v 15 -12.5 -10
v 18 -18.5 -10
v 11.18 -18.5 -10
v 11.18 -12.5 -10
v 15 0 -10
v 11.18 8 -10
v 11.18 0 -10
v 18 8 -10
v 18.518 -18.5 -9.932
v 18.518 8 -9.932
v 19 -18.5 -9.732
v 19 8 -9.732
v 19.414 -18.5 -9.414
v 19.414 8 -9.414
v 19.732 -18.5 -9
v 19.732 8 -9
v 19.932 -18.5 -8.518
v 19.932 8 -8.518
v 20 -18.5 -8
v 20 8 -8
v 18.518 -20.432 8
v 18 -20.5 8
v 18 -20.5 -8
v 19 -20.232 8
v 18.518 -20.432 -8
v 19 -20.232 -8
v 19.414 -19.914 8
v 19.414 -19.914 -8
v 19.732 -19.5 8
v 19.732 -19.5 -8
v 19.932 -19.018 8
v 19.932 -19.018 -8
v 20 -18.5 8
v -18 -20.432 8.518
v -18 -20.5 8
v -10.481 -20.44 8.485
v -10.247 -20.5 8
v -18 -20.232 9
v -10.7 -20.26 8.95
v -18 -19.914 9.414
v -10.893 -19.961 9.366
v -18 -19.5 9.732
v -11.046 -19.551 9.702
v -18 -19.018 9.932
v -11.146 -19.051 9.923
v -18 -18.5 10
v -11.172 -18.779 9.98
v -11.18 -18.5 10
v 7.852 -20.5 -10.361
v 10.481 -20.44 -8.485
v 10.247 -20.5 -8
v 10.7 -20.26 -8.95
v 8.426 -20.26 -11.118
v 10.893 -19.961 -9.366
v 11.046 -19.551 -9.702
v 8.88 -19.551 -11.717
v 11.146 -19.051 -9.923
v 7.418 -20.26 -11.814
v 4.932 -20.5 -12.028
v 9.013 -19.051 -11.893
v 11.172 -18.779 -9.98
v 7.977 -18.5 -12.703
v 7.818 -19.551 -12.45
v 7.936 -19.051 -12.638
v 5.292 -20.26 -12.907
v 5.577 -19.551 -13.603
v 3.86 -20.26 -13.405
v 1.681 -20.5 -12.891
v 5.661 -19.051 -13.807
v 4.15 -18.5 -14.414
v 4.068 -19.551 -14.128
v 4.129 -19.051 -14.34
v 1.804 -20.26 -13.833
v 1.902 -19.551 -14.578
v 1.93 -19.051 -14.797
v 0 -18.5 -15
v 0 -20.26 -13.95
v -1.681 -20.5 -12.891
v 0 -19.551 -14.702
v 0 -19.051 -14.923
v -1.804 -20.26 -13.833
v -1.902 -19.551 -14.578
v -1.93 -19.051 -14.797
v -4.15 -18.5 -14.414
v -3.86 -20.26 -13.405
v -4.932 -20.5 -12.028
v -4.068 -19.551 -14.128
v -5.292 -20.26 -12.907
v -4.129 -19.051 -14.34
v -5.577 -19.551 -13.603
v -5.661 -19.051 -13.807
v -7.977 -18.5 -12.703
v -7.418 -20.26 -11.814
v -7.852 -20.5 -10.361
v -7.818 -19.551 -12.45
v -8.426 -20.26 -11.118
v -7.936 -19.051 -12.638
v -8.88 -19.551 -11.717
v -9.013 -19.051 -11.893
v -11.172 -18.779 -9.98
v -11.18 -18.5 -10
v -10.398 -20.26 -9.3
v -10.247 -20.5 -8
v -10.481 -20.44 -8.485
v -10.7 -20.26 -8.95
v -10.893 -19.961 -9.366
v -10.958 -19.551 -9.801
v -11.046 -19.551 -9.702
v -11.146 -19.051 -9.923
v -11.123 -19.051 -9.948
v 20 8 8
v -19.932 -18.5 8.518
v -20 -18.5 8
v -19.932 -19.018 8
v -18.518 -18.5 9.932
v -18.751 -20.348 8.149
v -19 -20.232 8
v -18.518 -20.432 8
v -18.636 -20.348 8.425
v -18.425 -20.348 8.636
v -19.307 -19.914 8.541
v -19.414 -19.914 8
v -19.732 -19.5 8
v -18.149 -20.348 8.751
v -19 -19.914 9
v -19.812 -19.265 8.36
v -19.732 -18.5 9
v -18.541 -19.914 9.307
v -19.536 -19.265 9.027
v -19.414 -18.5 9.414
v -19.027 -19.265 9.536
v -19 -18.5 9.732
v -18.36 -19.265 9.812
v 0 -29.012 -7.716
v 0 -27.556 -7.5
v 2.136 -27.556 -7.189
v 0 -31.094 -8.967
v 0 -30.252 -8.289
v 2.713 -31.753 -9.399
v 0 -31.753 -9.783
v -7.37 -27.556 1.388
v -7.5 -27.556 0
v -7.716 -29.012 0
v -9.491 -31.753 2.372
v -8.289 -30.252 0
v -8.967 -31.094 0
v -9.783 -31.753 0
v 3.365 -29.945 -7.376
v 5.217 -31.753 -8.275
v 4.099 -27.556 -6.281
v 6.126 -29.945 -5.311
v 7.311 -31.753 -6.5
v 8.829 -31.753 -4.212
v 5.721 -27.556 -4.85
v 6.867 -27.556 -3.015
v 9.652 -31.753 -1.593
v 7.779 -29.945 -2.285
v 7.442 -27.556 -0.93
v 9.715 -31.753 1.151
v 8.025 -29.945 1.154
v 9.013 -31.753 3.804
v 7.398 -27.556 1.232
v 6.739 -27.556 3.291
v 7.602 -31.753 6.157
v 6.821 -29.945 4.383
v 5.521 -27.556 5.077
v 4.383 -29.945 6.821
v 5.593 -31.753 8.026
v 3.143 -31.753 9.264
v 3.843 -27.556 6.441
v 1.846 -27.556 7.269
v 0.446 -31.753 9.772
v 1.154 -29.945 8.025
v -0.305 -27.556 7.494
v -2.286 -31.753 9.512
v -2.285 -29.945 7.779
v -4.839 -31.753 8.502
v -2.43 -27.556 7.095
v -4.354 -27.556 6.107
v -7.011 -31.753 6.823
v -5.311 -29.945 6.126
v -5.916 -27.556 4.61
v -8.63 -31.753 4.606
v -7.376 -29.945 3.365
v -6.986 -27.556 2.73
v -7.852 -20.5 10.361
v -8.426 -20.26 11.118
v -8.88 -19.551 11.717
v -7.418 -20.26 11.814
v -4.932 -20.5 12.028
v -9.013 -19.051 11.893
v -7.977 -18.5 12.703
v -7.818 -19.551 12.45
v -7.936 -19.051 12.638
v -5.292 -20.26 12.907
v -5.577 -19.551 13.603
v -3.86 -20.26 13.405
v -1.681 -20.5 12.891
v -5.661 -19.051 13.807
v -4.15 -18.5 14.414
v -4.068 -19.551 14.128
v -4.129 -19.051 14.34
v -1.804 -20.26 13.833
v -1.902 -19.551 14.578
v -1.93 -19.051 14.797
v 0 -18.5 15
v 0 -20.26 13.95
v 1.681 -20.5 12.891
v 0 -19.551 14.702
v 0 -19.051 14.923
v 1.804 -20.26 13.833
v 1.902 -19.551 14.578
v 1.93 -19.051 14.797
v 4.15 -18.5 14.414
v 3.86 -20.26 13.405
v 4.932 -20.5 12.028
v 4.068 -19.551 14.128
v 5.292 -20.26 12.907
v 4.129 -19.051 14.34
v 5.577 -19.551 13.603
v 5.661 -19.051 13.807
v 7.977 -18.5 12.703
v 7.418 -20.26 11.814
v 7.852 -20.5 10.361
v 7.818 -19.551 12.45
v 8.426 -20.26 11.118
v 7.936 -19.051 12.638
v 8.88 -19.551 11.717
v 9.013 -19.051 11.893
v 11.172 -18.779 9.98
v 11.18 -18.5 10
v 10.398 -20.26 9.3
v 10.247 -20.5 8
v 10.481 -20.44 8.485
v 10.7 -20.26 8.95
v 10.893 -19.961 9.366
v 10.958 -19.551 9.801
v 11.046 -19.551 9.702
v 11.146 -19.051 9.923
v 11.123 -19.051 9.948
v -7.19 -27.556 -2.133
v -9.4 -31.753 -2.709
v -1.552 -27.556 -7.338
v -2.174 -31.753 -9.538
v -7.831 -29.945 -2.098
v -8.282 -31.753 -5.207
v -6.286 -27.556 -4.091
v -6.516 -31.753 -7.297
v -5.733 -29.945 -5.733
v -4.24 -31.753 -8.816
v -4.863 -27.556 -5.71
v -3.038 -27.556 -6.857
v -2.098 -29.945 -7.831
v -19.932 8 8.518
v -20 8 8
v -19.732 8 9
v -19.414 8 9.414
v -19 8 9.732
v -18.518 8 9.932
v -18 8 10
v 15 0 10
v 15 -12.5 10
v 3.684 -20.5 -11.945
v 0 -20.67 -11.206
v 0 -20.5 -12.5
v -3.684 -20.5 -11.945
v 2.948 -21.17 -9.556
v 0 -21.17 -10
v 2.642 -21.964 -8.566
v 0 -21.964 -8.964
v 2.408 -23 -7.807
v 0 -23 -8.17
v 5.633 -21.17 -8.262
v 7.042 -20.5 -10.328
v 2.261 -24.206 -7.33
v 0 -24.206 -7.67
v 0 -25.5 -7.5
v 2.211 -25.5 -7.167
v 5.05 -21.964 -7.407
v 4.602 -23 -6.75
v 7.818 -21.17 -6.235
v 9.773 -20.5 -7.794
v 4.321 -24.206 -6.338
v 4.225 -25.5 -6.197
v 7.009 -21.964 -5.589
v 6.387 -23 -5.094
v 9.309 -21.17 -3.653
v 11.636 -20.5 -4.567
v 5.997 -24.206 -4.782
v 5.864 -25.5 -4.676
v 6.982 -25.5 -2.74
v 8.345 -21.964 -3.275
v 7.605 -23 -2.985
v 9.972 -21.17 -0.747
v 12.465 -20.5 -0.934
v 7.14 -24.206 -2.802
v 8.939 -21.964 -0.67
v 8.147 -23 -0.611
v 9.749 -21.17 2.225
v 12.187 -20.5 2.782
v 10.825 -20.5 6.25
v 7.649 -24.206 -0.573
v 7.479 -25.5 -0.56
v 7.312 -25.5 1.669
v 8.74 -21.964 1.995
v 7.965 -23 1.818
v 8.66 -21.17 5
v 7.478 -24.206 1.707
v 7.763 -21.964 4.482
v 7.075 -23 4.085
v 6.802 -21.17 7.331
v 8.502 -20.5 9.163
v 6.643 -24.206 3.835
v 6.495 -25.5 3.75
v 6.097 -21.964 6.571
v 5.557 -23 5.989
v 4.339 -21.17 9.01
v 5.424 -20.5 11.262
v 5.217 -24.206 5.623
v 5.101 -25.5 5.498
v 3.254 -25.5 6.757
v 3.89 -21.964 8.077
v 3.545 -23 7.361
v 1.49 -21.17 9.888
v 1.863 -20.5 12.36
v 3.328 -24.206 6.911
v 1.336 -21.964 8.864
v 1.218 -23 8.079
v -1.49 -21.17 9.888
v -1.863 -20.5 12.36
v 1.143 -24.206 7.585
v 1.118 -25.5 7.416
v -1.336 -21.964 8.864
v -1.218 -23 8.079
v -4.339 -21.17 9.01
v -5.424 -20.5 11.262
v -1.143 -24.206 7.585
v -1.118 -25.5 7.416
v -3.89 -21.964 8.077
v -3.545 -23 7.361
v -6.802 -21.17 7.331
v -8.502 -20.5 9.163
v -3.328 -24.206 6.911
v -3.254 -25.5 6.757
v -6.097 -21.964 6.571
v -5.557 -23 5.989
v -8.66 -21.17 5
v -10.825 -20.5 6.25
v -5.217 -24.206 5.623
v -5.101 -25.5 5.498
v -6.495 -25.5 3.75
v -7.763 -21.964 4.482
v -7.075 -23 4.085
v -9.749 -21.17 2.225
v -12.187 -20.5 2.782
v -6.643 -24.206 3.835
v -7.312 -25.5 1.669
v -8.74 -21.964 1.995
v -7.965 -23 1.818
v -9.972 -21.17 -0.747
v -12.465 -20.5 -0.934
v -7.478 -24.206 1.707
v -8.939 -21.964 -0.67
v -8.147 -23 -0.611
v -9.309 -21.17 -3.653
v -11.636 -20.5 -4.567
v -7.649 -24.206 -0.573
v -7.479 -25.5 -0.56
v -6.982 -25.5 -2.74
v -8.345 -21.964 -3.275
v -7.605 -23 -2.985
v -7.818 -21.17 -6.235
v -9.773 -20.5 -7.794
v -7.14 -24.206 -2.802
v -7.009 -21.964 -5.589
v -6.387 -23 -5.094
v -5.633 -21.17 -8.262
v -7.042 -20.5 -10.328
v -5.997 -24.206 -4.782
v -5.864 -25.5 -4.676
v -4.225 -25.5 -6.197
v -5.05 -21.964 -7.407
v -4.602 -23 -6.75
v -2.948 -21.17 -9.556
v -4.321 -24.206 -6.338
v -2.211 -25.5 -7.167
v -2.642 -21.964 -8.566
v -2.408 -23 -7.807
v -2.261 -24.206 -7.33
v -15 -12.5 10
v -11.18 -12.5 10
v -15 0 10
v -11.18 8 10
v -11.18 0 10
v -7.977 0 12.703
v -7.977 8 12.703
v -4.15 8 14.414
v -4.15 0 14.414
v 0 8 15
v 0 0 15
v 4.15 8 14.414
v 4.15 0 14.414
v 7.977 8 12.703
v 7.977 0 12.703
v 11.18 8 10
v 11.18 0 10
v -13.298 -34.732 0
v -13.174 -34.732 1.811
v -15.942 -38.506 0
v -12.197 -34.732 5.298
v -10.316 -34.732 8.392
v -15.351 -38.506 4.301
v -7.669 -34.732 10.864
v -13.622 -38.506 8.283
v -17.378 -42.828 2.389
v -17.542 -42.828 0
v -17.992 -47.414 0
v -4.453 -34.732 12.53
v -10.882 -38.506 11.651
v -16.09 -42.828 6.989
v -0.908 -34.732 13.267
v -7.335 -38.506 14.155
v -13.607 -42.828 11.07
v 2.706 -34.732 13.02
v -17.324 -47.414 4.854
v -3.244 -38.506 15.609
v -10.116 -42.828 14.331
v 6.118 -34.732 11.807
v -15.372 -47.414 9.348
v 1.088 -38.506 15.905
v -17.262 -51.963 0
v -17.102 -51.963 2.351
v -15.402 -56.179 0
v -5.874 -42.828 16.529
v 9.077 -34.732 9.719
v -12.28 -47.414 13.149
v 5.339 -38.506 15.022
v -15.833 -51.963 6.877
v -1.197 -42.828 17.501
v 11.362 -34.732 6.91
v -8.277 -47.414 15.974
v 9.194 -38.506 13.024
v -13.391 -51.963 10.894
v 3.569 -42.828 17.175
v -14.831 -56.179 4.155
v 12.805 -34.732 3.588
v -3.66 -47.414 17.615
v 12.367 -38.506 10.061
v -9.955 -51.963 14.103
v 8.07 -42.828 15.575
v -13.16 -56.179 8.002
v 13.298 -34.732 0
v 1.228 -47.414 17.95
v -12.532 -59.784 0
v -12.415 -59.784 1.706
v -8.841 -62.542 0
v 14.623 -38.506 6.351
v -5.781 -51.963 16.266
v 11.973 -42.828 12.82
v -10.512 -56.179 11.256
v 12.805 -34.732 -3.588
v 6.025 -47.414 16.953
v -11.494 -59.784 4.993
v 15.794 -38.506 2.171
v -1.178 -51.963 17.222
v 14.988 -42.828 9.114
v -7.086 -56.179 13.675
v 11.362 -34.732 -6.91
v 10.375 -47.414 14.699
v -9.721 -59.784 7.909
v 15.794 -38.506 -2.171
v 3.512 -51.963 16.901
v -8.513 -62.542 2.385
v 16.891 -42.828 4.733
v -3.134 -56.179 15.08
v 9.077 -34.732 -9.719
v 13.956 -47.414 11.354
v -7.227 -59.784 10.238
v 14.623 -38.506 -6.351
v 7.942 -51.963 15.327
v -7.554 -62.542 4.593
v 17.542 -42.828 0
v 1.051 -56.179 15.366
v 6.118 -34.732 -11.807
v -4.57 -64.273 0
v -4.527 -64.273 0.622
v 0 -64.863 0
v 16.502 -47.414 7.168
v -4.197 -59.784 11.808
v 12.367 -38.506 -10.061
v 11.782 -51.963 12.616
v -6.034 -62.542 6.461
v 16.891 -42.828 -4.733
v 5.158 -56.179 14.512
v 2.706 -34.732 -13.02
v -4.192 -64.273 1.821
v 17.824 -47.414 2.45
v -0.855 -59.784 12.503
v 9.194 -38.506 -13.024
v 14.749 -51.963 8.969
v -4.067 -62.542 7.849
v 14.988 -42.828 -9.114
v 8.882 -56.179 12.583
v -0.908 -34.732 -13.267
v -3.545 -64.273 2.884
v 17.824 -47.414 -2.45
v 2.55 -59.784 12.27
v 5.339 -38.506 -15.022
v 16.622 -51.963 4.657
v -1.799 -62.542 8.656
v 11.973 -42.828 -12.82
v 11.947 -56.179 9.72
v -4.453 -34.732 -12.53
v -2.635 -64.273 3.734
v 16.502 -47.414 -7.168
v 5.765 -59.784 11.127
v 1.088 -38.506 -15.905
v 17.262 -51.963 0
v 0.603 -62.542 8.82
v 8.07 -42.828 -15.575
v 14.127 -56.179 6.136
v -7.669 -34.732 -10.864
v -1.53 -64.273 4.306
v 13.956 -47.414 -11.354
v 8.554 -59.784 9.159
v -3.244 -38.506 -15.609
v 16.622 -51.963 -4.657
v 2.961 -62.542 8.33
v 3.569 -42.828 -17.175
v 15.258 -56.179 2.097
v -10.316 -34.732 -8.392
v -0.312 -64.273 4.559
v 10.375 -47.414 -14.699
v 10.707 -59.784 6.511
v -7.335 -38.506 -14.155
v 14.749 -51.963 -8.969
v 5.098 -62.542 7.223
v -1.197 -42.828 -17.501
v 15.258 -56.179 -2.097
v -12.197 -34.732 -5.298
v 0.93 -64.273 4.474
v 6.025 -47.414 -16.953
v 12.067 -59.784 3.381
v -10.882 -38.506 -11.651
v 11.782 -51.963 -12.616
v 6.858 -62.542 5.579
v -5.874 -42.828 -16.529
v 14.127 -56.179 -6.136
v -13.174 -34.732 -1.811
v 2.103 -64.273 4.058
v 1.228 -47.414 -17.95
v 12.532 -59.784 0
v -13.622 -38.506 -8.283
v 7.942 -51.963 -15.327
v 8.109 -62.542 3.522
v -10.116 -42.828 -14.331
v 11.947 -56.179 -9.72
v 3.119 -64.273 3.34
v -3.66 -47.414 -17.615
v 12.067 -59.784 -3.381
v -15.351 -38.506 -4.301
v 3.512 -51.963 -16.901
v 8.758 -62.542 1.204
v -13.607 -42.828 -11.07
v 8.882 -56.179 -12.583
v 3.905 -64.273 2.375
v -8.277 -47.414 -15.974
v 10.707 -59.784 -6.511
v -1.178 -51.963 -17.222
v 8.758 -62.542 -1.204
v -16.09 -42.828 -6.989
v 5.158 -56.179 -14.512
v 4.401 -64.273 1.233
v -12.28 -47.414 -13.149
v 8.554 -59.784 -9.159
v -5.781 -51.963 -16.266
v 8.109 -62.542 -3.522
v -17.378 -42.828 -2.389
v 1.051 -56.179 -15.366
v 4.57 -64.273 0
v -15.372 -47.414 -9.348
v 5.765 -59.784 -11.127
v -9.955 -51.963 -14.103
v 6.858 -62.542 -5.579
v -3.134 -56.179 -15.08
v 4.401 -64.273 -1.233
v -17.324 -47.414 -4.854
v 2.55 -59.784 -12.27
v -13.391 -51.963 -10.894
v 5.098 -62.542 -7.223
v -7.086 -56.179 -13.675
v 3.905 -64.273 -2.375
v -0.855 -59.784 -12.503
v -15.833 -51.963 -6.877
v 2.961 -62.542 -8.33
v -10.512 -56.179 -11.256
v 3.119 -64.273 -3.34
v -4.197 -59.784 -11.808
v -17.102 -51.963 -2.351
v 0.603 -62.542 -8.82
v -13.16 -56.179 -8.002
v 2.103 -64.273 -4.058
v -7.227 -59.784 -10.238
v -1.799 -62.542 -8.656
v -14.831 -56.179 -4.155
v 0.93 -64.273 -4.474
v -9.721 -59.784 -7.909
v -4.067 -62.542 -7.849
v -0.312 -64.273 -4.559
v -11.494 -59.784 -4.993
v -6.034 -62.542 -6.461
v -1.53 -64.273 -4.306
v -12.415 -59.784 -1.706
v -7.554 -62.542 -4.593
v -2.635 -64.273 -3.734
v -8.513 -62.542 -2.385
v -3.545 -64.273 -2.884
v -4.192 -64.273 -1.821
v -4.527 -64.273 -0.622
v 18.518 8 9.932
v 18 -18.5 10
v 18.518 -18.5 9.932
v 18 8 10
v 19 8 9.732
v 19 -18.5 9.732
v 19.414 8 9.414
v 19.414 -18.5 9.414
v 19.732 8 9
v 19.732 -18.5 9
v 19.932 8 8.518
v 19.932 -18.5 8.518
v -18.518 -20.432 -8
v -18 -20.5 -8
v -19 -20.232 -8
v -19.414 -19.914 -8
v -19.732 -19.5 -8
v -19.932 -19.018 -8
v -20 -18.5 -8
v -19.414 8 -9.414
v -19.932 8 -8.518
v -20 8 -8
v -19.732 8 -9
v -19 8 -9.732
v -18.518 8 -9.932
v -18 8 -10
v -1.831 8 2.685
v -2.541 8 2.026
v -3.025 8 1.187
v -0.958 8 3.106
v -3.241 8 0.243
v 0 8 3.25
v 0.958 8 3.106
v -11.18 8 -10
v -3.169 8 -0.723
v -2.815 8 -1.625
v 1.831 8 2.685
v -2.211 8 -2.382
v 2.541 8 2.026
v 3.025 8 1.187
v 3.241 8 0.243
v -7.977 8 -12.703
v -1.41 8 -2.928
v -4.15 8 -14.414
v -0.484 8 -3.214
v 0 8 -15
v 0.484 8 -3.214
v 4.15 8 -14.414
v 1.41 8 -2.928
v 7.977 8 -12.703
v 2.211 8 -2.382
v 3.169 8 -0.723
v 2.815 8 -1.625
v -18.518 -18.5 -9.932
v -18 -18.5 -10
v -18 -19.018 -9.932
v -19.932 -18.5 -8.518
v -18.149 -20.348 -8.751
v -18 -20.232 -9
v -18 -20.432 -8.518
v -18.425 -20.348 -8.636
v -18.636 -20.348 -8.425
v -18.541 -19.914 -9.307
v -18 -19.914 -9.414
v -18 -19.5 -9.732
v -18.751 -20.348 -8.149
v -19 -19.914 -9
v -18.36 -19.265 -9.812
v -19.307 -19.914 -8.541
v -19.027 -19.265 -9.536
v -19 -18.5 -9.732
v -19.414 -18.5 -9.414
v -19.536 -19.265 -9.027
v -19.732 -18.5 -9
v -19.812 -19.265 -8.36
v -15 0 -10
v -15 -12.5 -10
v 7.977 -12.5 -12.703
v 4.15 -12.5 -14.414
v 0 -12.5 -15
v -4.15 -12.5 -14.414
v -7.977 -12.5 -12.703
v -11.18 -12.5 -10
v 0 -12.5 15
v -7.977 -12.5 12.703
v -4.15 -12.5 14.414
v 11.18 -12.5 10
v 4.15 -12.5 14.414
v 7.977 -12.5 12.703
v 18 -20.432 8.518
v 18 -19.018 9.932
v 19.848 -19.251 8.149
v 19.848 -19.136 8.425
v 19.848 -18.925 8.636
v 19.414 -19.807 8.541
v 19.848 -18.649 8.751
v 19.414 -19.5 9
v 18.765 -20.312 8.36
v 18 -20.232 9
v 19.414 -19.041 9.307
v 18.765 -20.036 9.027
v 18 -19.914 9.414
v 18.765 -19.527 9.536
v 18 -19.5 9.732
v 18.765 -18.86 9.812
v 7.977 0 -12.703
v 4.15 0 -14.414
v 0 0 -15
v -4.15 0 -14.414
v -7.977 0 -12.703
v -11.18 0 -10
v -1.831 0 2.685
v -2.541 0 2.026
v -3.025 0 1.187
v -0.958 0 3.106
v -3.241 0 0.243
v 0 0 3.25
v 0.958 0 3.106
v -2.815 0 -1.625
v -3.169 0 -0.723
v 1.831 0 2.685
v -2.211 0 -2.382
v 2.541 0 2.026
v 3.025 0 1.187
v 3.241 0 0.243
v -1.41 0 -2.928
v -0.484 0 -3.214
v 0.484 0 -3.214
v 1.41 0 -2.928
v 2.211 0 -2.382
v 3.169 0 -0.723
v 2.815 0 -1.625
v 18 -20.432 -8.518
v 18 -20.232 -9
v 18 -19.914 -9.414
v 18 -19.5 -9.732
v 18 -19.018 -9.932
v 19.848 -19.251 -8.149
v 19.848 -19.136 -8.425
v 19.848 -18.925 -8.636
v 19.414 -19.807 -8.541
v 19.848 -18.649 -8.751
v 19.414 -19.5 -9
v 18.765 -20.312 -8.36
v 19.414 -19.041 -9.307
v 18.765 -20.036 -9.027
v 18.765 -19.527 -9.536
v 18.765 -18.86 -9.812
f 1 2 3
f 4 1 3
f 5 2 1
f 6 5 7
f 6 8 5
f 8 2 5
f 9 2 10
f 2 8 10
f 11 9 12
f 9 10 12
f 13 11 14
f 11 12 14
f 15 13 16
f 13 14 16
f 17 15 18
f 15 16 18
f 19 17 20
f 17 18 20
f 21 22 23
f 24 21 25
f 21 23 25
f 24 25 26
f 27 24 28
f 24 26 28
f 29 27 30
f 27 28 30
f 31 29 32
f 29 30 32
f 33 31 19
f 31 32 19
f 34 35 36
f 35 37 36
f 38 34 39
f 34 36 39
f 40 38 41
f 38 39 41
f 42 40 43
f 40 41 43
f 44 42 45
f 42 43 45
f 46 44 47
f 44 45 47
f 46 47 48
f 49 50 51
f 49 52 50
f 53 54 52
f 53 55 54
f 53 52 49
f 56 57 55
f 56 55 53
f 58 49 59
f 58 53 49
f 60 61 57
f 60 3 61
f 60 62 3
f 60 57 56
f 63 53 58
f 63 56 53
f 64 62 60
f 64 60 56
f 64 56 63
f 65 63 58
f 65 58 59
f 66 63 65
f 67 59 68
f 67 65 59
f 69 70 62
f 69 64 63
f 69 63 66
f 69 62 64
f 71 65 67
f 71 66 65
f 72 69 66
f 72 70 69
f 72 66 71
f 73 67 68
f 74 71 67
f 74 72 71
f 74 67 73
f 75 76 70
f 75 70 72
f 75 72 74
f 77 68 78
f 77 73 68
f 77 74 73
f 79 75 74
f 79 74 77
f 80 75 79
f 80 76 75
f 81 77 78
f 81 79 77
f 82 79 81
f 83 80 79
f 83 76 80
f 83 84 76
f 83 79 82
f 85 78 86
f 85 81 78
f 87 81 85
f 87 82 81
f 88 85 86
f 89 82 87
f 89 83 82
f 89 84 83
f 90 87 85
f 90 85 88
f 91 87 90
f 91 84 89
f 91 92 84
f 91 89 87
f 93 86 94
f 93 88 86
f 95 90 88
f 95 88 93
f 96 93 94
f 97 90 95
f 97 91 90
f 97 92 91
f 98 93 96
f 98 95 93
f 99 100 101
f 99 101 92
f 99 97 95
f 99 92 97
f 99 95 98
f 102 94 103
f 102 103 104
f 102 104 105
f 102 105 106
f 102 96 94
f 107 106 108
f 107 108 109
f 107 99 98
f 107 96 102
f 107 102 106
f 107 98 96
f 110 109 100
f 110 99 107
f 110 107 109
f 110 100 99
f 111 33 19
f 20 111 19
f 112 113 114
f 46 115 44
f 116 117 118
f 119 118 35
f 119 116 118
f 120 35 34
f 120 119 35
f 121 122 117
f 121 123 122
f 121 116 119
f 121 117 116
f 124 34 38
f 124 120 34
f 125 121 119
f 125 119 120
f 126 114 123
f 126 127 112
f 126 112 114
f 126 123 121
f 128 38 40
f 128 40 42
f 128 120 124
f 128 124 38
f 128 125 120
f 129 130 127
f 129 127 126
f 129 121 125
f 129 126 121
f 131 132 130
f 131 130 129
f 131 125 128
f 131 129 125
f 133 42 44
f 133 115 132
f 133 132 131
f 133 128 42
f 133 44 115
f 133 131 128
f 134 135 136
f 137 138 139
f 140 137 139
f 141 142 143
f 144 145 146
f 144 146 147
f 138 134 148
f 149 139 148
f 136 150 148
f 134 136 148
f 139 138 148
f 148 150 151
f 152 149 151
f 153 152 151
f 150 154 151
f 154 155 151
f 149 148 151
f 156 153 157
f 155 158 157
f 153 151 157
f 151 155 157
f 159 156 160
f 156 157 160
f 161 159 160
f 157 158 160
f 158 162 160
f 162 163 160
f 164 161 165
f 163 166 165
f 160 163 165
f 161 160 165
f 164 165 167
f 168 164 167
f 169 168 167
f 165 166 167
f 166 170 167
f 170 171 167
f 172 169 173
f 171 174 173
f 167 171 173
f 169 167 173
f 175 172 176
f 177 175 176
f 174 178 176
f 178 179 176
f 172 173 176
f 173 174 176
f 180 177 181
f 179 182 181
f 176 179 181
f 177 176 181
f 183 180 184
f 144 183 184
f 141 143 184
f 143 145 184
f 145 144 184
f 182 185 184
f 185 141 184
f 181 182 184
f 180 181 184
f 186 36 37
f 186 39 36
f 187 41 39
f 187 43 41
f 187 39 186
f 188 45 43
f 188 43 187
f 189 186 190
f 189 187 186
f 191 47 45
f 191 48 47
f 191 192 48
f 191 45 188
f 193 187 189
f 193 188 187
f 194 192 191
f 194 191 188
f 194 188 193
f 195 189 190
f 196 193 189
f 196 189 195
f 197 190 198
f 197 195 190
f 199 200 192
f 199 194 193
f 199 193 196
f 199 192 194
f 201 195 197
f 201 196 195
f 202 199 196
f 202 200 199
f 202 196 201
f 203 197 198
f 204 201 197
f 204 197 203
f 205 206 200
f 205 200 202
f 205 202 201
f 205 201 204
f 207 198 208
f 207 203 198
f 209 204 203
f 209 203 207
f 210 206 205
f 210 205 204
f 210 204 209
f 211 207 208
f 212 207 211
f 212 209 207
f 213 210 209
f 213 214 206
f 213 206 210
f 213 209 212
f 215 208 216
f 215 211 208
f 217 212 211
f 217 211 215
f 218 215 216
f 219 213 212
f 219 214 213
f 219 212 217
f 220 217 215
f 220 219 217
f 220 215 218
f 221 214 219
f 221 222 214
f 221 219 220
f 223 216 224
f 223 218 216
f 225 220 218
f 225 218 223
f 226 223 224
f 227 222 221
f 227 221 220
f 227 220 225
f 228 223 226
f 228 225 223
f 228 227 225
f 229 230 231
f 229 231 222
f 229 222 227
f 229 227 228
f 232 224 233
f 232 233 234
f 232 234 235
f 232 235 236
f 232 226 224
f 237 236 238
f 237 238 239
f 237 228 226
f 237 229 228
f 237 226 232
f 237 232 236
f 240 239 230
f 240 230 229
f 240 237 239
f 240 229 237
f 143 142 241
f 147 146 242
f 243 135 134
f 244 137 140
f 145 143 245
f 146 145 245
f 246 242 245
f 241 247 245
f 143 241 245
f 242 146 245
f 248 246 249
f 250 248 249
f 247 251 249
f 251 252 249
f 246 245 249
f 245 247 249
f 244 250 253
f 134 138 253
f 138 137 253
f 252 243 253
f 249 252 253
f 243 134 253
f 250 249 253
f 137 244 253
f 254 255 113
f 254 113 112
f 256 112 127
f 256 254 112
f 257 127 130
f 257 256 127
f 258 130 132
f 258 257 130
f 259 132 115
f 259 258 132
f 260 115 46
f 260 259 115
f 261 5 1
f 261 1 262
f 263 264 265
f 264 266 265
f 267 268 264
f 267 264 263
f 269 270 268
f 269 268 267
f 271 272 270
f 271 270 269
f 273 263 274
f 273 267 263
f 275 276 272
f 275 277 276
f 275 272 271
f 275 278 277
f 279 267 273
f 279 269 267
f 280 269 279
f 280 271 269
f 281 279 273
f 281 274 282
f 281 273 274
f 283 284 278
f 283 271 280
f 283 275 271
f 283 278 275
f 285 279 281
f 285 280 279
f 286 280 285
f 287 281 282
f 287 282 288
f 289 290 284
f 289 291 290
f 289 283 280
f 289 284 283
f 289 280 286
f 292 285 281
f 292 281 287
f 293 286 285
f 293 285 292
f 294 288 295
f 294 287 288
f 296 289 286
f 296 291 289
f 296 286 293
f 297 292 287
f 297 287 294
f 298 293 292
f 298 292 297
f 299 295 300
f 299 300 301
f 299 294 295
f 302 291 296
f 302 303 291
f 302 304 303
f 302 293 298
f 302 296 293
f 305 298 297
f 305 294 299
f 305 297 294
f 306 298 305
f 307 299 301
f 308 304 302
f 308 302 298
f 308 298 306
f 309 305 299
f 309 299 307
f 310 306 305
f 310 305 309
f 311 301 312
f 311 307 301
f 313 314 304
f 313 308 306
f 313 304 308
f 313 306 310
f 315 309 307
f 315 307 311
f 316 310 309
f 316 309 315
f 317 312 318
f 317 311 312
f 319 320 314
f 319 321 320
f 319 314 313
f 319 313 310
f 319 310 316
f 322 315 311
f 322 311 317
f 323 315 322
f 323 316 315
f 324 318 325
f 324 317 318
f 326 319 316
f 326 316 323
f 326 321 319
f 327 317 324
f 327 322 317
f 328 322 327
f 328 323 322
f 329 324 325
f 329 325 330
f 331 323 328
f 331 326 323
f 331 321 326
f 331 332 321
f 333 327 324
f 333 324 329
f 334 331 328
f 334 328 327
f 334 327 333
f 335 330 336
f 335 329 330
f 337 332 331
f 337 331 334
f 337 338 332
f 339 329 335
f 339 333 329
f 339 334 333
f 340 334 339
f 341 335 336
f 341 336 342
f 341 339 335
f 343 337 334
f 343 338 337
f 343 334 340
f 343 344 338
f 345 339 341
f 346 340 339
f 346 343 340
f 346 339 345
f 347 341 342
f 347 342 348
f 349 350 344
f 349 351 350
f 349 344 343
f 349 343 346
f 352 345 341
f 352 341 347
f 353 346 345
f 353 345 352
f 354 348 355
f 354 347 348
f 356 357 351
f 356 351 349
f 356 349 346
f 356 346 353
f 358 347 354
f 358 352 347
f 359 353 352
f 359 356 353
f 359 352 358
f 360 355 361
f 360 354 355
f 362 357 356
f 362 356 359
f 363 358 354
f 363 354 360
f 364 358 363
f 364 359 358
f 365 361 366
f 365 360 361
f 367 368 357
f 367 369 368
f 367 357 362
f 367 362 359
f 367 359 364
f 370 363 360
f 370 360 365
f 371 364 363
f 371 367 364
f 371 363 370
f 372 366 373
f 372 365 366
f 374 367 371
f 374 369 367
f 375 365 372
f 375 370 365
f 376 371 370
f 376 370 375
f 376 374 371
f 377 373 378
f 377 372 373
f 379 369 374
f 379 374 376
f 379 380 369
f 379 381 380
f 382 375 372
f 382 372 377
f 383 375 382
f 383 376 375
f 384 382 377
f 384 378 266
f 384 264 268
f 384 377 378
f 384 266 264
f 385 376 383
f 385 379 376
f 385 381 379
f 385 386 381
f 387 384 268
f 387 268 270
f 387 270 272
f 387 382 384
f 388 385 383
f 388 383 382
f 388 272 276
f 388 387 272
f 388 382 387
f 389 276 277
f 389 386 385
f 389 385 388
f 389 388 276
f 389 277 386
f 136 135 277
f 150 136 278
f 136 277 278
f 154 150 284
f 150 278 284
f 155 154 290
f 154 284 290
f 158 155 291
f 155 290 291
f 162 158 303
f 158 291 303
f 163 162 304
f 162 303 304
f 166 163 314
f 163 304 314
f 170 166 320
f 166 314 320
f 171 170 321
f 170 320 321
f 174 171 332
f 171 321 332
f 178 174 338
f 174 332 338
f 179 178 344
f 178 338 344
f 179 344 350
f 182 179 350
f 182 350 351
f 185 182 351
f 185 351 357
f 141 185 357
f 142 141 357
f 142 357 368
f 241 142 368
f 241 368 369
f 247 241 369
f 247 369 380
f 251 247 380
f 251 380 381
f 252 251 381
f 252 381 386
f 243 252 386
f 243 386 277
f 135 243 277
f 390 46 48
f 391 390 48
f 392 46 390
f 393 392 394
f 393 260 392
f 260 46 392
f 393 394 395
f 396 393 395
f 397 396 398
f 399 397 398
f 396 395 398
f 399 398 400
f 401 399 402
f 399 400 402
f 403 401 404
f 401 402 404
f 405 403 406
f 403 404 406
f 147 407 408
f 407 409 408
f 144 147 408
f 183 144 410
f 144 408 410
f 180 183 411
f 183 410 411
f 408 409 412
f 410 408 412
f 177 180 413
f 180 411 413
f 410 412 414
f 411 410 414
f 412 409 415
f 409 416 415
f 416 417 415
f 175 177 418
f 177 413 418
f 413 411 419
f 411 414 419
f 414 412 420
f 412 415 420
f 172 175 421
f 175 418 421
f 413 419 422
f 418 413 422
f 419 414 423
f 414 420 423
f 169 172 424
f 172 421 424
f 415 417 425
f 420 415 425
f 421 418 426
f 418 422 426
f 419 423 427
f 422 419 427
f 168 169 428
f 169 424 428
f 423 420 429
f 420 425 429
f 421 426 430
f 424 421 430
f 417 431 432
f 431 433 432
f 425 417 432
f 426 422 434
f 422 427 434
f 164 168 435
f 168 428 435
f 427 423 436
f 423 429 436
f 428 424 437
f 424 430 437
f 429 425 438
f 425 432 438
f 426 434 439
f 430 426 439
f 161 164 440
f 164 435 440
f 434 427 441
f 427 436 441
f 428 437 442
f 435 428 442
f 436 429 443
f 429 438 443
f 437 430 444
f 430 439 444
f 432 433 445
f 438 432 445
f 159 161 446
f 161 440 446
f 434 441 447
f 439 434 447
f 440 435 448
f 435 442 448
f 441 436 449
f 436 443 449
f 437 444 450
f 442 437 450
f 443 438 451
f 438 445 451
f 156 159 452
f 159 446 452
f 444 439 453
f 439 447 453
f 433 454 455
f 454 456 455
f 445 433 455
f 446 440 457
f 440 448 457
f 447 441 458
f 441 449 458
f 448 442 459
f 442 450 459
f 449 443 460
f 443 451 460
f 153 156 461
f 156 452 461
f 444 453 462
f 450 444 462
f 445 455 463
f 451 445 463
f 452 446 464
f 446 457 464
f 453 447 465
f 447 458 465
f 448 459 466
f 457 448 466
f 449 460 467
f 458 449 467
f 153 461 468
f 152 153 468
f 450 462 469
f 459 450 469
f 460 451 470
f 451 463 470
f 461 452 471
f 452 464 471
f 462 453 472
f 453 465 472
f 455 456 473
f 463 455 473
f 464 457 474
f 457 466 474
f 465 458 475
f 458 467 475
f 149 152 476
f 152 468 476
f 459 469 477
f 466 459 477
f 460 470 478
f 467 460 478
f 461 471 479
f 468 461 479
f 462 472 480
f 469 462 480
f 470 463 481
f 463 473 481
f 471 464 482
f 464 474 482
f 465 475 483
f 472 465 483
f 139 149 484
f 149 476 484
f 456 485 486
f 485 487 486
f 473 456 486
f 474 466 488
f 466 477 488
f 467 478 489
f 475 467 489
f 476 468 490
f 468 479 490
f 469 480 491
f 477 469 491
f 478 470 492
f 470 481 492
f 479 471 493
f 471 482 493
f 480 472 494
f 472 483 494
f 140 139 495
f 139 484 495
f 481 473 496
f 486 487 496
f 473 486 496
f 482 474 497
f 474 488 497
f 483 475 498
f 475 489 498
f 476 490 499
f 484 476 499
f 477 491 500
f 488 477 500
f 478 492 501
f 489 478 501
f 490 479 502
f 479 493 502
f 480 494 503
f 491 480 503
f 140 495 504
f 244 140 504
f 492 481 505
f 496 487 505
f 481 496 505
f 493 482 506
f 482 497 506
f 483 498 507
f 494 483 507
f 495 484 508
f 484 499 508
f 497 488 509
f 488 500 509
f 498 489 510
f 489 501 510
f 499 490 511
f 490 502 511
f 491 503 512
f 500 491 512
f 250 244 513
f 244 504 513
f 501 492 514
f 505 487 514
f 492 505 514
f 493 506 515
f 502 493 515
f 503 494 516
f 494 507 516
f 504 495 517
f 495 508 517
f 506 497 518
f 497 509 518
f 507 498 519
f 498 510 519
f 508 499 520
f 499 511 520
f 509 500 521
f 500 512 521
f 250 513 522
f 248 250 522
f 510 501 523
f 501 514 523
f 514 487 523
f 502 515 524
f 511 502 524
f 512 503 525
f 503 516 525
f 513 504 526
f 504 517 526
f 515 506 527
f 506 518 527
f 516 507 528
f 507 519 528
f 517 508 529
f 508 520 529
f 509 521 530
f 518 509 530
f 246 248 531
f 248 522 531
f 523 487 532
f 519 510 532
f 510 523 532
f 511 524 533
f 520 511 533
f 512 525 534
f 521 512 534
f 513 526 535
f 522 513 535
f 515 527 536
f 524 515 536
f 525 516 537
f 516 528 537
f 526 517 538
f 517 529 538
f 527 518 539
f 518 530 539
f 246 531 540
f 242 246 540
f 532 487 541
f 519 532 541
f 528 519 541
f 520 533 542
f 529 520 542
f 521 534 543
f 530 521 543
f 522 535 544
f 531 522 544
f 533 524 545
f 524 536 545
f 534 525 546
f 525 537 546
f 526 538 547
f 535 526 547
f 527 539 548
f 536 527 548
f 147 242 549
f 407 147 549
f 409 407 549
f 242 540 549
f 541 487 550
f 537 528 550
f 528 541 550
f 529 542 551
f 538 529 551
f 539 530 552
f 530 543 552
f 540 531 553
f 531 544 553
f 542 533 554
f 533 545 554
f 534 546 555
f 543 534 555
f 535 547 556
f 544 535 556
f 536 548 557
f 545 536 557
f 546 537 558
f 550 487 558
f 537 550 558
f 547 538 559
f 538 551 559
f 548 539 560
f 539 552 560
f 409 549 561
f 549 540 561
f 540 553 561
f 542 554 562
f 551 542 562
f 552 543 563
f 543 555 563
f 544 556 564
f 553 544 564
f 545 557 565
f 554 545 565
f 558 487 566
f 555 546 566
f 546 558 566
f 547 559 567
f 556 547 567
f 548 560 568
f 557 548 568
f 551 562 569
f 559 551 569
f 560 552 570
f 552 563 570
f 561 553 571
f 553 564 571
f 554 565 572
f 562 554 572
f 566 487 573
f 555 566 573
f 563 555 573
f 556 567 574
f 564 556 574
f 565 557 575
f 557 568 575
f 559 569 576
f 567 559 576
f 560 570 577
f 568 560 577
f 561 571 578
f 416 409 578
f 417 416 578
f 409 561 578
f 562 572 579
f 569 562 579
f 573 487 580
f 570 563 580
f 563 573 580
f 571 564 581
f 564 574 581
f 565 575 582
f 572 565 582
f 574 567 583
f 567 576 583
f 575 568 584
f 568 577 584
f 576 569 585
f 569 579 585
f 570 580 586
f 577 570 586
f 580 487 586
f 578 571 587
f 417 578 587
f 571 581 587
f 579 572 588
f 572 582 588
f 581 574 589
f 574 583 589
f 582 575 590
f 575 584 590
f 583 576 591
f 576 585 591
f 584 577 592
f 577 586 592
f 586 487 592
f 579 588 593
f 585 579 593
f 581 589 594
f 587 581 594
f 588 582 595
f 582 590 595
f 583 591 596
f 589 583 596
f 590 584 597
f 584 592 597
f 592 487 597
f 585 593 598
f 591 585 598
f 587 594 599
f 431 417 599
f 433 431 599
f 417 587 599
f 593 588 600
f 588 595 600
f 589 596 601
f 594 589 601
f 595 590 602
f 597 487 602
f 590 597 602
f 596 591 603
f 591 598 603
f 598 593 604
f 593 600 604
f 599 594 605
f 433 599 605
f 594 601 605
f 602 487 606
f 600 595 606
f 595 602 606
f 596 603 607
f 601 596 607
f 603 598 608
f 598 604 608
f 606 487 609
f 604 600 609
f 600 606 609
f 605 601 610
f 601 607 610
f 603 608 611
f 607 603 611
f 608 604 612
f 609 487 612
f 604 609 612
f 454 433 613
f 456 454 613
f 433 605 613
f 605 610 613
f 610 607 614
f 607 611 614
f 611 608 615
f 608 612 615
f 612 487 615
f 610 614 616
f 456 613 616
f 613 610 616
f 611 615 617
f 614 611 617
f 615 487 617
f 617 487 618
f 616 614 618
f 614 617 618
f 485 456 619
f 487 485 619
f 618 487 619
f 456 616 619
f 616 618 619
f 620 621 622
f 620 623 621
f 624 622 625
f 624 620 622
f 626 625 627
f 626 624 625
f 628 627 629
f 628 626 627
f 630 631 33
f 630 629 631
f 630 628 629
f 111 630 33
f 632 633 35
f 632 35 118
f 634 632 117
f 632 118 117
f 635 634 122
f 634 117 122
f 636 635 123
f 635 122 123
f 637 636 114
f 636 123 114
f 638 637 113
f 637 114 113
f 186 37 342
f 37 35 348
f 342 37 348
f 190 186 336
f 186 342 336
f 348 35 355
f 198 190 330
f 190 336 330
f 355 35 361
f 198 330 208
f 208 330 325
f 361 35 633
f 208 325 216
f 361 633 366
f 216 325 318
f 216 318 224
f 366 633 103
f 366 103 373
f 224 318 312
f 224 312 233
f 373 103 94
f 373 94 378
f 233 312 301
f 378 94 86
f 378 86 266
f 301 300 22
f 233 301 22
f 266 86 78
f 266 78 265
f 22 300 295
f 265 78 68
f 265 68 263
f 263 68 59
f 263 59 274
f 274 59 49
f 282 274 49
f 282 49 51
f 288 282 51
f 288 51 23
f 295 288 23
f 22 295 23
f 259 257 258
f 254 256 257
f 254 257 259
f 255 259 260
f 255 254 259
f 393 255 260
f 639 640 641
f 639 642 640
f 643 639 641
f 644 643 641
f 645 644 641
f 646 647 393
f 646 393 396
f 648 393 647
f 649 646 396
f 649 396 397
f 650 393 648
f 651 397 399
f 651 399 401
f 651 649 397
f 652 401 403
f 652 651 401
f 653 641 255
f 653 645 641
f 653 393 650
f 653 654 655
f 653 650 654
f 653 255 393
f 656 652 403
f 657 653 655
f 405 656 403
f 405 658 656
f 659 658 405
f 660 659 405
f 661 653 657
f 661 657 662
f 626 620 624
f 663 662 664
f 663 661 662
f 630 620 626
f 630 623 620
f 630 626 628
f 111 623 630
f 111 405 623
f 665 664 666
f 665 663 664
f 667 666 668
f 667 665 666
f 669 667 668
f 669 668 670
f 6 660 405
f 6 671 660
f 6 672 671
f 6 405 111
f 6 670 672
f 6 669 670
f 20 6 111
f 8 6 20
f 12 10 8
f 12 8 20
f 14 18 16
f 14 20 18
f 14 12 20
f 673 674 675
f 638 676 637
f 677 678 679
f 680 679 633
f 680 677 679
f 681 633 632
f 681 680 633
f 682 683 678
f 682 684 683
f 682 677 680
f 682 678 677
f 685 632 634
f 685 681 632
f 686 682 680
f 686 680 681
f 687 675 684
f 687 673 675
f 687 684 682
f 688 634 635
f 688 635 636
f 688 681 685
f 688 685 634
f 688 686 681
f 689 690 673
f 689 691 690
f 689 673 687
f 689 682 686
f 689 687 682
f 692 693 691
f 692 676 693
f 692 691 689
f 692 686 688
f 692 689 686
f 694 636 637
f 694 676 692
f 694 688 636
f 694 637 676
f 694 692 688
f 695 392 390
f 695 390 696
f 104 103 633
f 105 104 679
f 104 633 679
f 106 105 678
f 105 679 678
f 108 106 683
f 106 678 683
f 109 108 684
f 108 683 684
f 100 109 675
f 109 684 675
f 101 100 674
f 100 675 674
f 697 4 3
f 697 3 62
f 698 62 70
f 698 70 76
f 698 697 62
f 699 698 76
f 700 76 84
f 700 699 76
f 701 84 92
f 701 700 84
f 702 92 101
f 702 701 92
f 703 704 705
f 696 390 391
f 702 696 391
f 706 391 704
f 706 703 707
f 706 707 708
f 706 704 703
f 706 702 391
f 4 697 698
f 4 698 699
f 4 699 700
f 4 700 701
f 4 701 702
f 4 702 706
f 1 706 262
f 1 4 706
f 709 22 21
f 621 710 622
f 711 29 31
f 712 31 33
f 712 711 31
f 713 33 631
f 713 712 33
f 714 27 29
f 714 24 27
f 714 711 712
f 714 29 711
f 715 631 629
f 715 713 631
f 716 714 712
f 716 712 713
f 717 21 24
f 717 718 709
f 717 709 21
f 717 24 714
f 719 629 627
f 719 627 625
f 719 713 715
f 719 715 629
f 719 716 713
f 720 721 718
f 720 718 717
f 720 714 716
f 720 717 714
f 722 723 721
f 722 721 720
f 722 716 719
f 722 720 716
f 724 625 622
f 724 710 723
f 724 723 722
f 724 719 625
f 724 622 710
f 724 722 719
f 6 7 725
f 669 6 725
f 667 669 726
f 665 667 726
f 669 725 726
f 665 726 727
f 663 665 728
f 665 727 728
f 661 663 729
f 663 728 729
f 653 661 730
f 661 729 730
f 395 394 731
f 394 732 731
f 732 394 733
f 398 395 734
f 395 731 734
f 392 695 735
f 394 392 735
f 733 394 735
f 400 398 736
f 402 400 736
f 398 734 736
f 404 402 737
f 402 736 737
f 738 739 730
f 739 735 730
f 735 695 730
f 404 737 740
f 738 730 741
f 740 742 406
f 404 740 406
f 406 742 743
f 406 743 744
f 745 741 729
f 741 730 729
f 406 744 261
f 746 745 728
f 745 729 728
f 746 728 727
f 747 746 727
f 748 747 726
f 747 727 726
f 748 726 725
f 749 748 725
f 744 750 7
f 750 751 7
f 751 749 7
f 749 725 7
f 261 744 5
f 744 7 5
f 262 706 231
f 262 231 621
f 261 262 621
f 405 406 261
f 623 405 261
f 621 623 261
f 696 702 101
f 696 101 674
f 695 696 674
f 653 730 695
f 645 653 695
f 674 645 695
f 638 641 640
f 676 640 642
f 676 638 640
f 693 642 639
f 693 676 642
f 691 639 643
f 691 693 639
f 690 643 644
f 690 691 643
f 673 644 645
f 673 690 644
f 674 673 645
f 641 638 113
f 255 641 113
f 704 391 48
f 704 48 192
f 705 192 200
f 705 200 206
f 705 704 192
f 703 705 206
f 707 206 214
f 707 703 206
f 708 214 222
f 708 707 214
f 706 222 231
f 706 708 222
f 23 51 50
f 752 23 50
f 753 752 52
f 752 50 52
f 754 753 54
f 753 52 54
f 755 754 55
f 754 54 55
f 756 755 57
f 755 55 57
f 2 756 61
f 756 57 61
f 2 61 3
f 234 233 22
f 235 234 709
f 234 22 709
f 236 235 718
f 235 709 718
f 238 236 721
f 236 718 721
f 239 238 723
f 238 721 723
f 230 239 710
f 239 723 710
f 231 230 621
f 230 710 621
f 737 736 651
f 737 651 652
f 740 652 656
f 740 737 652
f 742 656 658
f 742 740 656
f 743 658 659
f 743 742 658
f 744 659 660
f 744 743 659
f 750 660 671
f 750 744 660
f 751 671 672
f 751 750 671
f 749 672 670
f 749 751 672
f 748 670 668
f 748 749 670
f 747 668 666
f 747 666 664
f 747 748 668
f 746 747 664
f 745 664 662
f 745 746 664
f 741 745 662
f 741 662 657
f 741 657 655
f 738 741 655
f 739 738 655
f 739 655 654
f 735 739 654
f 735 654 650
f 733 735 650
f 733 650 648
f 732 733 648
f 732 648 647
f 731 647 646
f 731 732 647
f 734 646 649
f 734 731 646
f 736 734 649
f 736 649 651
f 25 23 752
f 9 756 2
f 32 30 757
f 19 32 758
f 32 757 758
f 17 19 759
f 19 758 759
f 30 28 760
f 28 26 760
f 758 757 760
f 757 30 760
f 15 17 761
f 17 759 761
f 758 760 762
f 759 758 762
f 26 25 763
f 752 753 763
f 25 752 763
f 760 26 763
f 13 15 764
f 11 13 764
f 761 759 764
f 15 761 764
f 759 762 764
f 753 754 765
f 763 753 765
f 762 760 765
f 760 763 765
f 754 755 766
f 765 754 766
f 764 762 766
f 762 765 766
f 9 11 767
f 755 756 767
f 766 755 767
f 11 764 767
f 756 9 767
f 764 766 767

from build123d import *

# Parameters (mm, degrees)
SKETCH1_R           = 3.25
BOSS_EXTRUDE1_DEPTH = 8
BOSS_EXTRUDE2_DEPTH = 12.5
BOSS_EXTRUDE3_START = -12.5
BOSS_EXTRUDE3_DEPTH = 8
SKETCH2_R           = 7.5
BOSS_EXTRUDE4_DEPTH = 10
FILLET2_R           = 2
FILLET3_R           = 5


with BuildPart() as part:
    # Sketch1 → Boss-Extrude1 (new body)
    with BuildSketch(Plane(origin=(0, 0, 0), x_dir=(1, 0, 0), z_dir=(0, 1, 0))):
        with BuildLine():
            Line((-20, 10), (-20, -10))
            Line((-20, -10), (-11.180339887, -10))
            ThreePointArc((-11.180339887, -10), (0, -15), (11.180339887, -10))
            Line((11.180339887, -10), (20, -10))
            Line((20, -10), (20, 10))
            Line((20, 10), (11.180339887, 10))
            ThreePointArc((11.180339887, 10), (0, 15), (-11.180339887, 10))
            Line((-11.180339887, 10), (-20, 10))
        make_face()
        with Locations(Location((0, 0, 0), (0, 0, 270))):
            Circle(SKETCH1_R, mode=Mode.SUBTRACT)
    extrude(amount=BOSS_EXTRUDE1_DEPTH)

    # Sketch1<3> → Boss-Extrude2 (add)
    with BuildSketch(Plane(origin=(0, 0, 0), x_dir=(1, 0, 0), z_dir=(0, 1, 0))):
        Polygon((-15, 10), (-20, 10), (-20, -10), (-15, -10), (-15, 0), align=None)
        Polygon((20, 10), (15, 10), (15, 0), (15, -10), (20, -10), align=None)
    extrude(amount=-BOSS_EXTRUDE2_DEPTH)

    # Sketch1<4> → Boss-Extrude3 (add)
    with BuildSketch(Plane(origin=(0, 0, 0), x_dir=(1, 0, 0), z_dir=(0, 1, 0)).offset(BOSS_EXTRUDE3_START)):
        with BuildLine():
            Line((-20, 10), (-20, -10))
            Line((-20, -10), (-11.180339887, -10))
            ThreePointArc((-11.180339887, -10), (0, -15), (11.180339887, -10))
            Line((11.180339887, -10), (20, -10))
            Line((20, -10), (20, 10))
            Line((20, 10), (11.180339887, 10))
            ThreePointArc((11.180339887, 10), (0, 15), (-11.180339887, 10))
            Line((-11.180339887, 10), (-20, 10))
        make_face()
    extrude(amount=-BOSS_EXTRUDE3_DEPTH)

    # Sketch2 → Boss-Extrude4 (add)
    with BuildSketch(Plane.XZ.offset(20.5)):
        with Locations(Location((0, 0, 0), (0, 0, 270))):
            Circle(SKETCH2_R)
    extrude(amount=BOSS_EXTRUDE4_DEPTH)

    # Sketch3 → Revolve1 (revolve)
    with BuildSketch(Plane.XY):
        with BuildLine():
            ThreePointArc((0, -28.863068172), (-3.8382791, -29.277061987), (-7.5, -30.5))
            Line((-7.5, -30.5), (0, -30.5))
            Line((0, -30.5), (0, -28.863068172))
        make_face()
        with BuildLine():
            Line((0, -30.5), (-7.5, -30.5))
            ThreePointArc((-7.5, -30.5), (-17.586006185, -50.701347272), (0, -64.863068172))
            Line((0, -64.863068172), (0, -30.5))
        make_face()
    revolve(axis=Axis((0, -64.863068172, 0), (0, 1, 0)))

    # Fillet2
    fillet2_edges = [part.edges().sort_by_distance(p)[0] for p in [
        (-20, -6.25, -10),
        (-20, -6.25, 10),
        (15.590169944, -20.5, 10),
        (0, -20.5, -15),
        (0, -20.5, 15),
        (-15.590169944, -20.5, -10),
        (15.590169944, -20.5, -10),
        (20, -20.5, 0),
        (-20, -20.5, 0),
        (20, -6.25, -10),
        (-15.590169944, -20.5, 10),
        (20, -6.25, 10),
    ]]
    fillet(fillet2_edges, radius=FILLET2_R)

    # Fillet3
    fillet3_edges = [part.edges().sort_by_distance(p)[0] for p in [
        (0, -20.5, 7.5),
        (-5.303300859, -30.5, -5.303300859),
    ]]
    fillet(fillet3_edges, radius=FILLET3_R)


solid = part.part
